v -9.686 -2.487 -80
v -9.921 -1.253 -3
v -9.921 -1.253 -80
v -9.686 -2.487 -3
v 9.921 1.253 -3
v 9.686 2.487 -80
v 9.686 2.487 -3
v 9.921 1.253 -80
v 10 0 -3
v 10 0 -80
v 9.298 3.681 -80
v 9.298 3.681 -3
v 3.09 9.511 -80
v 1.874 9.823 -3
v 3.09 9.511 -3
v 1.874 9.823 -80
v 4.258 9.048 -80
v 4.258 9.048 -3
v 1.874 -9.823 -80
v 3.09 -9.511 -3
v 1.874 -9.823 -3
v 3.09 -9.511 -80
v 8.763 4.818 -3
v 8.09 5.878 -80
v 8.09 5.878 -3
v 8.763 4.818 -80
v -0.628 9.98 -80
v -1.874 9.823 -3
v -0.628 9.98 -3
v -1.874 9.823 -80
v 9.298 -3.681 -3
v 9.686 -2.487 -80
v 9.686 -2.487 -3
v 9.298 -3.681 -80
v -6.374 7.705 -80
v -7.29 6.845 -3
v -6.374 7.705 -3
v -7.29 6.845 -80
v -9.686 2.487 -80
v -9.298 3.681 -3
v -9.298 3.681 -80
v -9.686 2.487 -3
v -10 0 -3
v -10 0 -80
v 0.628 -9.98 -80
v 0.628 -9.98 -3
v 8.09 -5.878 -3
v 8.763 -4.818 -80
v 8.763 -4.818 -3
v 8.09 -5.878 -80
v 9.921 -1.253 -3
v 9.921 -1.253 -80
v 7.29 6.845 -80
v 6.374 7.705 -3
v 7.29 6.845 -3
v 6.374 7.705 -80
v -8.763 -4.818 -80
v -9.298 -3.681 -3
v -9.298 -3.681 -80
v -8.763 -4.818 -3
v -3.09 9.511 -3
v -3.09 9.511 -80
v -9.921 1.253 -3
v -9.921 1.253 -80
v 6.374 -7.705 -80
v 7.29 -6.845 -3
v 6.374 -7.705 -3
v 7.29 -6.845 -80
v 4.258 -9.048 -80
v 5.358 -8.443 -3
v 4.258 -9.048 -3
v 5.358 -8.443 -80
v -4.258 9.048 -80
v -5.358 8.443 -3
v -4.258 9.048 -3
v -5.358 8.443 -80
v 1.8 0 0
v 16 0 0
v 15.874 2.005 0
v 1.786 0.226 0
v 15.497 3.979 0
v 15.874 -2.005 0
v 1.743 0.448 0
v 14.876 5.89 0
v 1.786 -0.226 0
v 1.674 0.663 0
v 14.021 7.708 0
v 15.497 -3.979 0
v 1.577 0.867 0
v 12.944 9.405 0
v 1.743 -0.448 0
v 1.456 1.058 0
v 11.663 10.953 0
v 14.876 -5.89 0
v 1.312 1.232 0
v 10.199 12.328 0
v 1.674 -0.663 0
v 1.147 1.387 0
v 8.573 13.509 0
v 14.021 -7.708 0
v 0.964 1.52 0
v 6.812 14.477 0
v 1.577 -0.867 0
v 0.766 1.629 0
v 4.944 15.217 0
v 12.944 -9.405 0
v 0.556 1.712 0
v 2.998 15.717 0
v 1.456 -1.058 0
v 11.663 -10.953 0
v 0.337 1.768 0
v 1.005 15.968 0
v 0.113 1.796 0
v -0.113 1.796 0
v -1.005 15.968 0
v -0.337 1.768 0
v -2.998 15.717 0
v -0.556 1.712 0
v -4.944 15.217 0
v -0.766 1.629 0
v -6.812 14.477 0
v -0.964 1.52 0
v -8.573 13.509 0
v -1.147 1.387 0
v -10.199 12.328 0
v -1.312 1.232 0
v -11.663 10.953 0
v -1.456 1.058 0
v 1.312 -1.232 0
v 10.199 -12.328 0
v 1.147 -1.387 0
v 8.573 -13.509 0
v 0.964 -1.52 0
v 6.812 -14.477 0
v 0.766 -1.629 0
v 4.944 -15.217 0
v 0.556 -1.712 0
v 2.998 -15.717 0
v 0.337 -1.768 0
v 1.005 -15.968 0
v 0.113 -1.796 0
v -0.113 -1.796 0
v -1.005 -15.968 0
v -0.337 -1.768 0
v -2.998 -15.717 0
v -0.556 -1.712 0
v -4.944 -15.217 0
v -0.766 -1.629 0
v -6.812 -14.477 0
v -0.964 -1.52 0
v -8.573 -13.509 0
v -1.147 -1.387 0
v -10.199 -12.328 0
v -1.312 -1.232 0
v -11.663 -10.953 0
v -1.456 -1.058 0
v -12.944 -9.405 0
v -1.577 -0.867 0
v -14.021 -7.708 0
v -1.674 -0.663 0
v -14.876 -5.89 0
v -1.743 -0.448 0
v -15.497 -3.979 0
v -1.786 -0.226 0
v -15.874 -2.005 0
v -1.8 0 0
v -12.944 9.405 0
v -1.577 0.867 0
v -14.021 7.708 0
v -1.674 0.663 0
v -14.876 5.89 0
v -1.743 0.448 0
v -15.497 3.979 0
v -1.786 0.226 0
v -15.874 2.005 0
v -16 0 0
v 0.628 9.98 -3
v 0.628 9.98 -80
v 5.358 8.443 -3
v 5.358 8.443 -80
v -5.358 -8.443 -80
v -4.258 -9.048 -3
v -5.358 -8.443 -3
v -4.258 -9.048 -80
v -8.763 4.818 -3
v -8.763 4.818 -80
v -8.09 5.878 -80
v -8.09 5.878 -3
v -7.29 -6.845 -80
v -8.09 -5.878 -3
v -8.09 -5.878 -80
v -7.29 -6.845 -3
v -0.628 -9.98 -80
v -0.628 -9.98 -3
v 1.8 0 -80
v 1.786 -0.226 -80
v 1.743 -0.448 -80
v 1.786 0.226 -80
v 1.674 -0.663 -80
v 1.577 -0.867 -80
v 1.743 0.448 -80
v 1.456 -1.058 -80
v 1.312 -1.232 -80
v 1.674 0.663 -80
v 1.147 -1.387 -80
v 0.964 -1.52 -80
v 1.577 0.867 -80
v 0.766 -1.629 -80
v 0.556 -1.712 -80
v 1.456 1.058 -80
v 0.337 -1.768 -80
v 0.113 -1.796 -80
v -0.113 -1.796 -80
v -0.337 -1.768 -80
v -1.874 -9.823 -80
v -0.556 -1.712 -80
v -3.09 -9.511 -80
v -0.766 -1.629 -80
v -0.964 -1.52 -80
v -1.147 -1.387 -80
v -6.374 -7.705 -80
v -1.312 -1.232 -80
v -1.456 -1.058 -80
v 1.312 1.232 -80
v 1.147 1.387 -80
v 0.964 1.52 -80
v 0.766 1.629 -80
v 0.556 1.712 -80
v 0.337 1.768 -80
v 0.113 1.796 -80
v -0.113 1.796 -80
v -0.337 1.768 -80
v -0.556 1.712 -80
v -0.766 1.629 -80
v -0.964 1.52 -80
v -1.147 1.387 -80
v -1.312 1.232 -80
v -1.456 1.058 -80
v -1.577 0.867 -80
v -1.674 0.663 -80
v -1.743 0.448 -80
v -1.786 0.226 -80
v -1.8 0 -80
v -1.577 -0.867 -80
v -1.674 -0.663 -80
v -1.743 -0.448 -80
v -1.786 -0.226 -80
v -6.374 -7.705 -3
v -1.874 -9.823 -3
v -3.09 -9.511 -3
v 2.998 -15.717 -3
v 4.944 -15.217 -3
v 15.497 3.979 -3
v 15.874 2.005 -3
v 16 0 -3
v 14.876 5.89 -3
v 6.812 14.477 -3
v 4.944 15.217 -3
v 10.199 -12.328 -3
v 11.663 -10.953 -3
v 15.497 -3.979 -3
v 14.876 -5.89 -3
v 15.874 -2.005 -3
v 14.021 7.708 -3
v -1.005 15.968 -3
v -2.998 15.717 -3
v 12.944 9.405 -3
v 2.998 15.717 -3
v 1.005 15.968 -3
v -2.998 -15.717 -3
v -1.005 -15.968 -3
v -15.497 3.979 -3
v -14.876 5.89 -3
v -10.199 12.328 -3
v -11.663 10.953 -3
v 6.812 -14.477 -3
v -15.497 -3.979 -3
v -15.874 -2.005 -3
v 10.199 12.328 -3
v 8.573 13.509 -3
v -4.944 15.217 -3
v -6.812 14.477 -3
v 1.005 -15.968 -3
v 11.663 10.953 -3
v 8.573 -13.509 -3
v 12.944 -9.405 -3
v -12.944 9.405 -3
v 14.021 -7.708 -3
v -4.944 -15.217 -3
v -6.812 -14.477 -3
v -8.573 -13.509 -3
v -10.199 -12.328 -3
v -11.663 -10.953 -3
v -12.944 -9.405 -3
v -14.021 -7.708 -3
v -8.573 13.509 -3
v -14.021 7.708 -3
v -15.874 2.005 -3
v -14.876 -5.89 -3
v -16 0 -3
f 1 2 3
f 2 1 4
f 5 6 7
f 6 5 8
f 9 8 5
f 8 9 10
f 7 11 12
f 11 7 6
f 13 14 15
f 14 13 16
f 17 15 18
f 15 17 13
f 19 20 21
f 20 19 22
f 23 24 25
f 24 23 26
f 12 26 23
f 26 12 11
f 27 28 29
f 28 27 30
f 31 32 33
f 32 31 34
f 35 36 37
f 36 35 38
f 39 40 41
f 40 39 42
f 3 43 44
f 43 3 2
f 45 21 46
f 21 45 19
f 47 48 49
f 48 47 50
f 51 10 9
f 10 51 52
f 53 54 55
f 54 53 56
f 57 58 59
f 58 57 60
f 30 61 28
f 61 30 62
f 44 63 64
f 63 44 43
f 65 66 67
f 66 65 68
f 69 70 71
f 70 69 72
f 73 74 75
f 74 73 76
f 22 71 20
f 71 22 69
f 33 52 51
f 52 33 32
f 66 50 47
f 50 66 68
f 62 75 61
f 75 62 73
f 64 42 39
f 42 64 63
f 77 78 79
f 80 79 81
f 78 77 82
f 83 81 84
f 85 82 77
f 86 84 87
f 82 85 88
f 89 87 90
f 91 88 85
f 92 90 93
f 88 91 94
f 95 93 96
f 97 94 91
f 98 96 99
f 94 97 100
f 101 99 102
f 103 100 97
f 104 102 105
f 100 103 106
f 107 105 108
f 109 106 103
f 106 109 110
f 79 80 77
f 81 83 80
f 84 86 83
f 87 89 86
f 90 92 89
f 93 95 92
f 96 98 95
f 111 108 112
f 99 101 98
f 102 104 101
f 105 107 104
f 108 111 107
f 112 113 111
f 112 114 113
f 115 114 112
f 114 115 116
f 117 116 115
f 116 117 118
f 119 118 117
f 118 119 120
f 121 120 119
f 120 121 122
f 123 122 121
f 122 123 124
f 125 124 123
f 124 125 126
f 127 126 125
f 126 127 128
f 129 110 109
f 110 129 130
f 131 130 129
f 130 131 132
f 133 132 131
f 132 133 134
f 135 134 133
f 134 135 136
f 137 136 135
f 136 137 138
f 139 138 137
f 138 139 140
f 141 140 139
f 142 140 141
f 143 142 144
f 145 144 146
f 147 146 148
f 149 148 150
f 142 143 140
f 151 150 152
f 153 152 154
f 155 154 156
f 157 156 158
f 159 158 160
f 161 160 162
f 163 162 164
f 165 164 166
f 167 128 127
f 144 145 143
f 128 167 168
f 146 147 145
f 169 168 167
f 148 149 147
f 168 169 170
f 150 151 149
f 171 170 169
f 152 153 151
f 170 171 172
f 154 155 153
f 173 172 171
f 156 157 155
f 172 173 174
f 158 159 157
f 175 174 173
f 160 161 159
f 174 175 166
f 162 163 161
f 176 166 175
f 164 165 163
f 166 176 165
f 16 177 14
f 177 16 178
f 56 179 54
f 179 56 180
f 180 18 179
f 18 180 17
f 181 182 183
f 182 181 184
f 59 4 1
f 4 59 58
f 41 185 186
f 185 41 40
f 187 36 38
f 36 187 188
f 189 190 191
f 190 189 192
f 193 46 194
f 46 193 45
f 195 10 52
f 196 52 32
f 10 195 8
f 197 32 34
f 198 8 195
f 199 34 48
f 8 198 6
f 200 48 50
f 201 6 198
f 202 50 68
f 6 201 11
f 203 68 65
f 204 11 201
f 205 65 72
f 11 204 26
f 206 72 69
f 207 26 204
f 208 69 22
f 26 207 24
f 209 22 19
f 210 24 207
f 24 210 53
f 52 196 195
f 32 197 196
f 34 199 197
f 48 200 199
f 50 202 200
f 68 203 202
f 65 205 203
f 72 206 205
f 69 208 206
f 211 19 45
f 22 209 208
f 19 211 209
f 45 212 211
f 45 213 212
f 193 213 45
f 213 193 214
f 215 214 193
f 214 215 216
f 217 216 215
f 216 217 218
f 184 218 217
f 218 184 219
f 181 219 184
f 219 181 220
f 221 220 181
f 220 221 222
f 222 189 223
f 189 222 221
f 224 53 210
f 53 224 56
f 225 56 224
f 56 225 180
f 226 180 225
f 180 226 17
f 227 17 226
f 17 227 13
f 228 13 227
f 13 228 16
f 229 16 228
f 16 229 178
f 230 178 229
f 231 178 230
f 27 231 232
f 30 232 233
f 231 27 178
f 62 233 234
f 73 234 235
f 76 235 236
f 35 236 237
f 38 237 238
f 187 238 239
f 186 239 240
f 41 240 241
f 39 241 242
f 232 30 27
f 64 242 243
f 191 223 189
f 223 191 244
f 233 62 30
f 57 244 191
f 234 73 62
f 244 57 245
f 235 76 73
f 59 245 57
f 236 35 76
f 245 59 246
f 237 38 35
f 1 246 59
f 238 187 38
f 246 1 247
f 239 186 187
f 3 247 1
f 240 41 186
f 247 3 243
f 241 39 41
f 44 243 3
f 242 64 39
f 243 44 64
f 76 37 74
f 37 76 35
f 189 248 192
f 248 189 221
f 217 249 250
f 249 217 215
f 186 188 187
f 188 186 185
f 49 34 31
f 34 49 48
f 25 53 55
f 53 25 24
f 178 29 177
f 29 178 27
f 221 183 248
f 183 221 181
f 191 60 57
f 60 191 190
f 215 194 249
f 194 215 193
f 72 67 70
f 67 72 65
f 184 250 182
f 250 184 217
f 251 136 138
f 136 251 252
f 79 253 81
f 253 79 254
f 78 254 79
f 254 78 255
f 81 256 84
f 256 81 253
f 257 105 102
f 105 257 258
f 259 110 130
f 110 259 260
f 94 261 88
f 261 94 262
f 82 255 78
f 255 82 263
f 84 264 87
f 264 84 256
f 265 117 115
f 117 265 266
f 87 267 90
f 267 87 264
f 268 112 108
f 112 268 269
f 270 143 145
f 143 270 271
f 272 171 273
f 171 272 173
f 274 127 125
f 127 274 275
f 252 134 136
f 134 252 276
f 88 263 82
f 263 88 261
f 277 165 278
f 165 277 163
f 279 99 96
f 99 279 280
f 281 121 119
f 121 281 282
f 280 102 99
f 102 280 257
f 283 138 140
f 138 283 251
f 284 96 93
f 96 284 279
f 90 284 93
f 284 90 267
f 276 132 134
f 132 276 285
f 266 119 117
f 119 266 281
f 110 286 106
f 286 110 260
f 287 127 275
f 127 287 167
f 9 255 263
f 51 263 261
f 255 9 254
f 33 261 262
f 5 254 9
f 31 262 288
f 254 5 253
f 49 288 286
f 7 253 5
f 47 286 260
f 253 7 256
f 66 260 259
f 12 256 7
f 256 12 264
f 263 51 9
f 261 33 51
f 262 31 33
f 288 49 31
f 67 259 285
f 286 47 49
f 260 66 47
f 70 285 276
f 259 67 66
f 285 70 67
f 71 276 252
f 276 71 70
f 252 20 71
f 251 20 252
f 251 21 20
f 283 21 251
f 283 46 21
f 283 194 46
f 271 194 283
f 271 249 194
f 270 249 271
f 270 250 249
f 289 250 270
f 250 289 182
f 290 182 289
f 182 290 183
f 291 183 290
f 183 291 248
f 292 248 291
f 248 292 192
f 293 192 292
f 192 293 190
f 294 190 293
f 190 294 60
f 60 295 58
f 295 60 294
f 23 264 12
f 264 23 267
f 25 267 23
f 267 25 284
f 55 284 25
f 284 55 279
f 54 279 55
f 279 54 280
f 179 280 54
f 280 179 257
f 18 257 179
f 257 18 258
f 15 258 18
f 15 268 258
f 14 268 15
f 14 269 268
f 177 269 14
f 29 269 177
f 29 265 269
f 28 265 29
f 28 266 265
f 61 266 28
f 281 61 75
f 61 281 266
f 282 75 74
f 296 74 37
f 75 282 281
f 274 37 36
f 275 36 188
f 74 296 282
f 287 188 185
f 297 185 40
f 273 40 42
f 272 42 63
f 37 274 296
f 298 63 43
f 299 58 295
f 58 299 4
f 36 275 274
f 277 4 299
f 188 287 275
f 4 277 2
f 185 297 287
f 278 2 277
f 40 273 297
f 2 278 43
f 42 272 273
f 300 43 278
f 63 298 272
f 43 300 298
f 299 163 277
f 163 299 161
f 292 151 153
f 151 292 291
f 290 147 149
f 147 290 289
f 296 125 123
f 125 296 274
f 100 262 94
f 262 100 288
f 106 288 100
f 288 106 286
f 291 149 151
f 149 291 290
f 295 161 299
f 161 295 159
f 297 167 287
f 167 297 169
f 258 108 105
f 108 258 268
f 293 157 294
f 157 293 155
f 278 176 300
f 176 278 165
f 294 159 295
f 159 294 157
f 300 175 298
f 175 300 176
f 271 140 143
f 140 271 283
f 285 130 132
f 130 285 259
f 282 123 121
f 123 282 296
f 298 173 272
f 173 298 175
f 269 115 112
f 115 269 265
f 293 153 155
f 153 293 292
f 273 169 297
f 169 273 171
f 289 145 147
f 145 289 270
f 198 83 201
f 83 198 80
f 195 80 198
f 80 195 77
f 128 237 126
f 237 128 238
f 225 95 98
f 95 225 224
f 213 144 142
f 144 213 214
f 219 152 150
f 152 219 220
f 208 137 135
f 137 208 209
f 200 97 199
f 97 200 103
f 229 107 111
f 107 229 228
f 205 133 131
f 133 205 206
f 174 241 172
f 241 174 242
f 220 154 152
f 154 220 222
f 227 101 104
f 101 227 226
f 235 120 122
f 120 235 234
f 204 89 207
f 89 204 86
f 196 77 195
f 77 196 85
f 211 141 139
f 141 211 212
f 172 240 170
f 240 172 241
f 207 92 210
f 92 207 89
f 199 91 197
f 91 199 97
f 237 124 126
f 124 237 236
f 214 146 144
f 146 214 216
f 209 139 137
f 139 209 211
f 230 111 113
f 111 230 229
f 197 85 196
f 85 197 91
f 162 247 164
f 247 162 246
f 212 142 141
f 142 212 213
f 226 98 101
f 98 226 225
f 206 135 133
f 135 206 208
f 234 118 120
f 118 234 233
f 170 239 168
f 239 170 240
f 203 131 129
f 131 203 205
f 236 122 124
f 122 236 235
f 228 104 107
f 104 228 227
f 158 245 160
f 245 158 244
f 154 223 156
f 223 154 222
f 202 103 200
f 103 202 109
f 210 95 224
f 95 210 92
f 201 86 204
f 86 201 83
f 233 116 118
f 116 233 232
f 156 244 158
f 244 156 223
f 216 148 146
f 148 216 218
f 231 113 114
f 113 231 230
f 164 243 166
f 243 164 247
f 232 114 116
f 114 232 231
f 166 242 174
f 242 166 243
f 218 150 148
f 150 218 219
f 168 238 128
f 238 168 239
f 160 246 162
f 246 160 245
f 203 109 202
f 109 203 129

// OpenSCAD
$fn = 50;


difference() {
	union() {
		translate(v = [0, 0, -80.0000000000]) {
			cylinder(h = 80, r = 10.0000000000);
		}
		translate(v = [0, 0, -3.0000000000]) {
			cylinder(h = 3, r = 16.0000000000);
		}
	}
	union() {
		#translate(v = [0, 0, -80]) {
			cylinder(h = 80, r = 1.8000000000);
		}
	}
}
